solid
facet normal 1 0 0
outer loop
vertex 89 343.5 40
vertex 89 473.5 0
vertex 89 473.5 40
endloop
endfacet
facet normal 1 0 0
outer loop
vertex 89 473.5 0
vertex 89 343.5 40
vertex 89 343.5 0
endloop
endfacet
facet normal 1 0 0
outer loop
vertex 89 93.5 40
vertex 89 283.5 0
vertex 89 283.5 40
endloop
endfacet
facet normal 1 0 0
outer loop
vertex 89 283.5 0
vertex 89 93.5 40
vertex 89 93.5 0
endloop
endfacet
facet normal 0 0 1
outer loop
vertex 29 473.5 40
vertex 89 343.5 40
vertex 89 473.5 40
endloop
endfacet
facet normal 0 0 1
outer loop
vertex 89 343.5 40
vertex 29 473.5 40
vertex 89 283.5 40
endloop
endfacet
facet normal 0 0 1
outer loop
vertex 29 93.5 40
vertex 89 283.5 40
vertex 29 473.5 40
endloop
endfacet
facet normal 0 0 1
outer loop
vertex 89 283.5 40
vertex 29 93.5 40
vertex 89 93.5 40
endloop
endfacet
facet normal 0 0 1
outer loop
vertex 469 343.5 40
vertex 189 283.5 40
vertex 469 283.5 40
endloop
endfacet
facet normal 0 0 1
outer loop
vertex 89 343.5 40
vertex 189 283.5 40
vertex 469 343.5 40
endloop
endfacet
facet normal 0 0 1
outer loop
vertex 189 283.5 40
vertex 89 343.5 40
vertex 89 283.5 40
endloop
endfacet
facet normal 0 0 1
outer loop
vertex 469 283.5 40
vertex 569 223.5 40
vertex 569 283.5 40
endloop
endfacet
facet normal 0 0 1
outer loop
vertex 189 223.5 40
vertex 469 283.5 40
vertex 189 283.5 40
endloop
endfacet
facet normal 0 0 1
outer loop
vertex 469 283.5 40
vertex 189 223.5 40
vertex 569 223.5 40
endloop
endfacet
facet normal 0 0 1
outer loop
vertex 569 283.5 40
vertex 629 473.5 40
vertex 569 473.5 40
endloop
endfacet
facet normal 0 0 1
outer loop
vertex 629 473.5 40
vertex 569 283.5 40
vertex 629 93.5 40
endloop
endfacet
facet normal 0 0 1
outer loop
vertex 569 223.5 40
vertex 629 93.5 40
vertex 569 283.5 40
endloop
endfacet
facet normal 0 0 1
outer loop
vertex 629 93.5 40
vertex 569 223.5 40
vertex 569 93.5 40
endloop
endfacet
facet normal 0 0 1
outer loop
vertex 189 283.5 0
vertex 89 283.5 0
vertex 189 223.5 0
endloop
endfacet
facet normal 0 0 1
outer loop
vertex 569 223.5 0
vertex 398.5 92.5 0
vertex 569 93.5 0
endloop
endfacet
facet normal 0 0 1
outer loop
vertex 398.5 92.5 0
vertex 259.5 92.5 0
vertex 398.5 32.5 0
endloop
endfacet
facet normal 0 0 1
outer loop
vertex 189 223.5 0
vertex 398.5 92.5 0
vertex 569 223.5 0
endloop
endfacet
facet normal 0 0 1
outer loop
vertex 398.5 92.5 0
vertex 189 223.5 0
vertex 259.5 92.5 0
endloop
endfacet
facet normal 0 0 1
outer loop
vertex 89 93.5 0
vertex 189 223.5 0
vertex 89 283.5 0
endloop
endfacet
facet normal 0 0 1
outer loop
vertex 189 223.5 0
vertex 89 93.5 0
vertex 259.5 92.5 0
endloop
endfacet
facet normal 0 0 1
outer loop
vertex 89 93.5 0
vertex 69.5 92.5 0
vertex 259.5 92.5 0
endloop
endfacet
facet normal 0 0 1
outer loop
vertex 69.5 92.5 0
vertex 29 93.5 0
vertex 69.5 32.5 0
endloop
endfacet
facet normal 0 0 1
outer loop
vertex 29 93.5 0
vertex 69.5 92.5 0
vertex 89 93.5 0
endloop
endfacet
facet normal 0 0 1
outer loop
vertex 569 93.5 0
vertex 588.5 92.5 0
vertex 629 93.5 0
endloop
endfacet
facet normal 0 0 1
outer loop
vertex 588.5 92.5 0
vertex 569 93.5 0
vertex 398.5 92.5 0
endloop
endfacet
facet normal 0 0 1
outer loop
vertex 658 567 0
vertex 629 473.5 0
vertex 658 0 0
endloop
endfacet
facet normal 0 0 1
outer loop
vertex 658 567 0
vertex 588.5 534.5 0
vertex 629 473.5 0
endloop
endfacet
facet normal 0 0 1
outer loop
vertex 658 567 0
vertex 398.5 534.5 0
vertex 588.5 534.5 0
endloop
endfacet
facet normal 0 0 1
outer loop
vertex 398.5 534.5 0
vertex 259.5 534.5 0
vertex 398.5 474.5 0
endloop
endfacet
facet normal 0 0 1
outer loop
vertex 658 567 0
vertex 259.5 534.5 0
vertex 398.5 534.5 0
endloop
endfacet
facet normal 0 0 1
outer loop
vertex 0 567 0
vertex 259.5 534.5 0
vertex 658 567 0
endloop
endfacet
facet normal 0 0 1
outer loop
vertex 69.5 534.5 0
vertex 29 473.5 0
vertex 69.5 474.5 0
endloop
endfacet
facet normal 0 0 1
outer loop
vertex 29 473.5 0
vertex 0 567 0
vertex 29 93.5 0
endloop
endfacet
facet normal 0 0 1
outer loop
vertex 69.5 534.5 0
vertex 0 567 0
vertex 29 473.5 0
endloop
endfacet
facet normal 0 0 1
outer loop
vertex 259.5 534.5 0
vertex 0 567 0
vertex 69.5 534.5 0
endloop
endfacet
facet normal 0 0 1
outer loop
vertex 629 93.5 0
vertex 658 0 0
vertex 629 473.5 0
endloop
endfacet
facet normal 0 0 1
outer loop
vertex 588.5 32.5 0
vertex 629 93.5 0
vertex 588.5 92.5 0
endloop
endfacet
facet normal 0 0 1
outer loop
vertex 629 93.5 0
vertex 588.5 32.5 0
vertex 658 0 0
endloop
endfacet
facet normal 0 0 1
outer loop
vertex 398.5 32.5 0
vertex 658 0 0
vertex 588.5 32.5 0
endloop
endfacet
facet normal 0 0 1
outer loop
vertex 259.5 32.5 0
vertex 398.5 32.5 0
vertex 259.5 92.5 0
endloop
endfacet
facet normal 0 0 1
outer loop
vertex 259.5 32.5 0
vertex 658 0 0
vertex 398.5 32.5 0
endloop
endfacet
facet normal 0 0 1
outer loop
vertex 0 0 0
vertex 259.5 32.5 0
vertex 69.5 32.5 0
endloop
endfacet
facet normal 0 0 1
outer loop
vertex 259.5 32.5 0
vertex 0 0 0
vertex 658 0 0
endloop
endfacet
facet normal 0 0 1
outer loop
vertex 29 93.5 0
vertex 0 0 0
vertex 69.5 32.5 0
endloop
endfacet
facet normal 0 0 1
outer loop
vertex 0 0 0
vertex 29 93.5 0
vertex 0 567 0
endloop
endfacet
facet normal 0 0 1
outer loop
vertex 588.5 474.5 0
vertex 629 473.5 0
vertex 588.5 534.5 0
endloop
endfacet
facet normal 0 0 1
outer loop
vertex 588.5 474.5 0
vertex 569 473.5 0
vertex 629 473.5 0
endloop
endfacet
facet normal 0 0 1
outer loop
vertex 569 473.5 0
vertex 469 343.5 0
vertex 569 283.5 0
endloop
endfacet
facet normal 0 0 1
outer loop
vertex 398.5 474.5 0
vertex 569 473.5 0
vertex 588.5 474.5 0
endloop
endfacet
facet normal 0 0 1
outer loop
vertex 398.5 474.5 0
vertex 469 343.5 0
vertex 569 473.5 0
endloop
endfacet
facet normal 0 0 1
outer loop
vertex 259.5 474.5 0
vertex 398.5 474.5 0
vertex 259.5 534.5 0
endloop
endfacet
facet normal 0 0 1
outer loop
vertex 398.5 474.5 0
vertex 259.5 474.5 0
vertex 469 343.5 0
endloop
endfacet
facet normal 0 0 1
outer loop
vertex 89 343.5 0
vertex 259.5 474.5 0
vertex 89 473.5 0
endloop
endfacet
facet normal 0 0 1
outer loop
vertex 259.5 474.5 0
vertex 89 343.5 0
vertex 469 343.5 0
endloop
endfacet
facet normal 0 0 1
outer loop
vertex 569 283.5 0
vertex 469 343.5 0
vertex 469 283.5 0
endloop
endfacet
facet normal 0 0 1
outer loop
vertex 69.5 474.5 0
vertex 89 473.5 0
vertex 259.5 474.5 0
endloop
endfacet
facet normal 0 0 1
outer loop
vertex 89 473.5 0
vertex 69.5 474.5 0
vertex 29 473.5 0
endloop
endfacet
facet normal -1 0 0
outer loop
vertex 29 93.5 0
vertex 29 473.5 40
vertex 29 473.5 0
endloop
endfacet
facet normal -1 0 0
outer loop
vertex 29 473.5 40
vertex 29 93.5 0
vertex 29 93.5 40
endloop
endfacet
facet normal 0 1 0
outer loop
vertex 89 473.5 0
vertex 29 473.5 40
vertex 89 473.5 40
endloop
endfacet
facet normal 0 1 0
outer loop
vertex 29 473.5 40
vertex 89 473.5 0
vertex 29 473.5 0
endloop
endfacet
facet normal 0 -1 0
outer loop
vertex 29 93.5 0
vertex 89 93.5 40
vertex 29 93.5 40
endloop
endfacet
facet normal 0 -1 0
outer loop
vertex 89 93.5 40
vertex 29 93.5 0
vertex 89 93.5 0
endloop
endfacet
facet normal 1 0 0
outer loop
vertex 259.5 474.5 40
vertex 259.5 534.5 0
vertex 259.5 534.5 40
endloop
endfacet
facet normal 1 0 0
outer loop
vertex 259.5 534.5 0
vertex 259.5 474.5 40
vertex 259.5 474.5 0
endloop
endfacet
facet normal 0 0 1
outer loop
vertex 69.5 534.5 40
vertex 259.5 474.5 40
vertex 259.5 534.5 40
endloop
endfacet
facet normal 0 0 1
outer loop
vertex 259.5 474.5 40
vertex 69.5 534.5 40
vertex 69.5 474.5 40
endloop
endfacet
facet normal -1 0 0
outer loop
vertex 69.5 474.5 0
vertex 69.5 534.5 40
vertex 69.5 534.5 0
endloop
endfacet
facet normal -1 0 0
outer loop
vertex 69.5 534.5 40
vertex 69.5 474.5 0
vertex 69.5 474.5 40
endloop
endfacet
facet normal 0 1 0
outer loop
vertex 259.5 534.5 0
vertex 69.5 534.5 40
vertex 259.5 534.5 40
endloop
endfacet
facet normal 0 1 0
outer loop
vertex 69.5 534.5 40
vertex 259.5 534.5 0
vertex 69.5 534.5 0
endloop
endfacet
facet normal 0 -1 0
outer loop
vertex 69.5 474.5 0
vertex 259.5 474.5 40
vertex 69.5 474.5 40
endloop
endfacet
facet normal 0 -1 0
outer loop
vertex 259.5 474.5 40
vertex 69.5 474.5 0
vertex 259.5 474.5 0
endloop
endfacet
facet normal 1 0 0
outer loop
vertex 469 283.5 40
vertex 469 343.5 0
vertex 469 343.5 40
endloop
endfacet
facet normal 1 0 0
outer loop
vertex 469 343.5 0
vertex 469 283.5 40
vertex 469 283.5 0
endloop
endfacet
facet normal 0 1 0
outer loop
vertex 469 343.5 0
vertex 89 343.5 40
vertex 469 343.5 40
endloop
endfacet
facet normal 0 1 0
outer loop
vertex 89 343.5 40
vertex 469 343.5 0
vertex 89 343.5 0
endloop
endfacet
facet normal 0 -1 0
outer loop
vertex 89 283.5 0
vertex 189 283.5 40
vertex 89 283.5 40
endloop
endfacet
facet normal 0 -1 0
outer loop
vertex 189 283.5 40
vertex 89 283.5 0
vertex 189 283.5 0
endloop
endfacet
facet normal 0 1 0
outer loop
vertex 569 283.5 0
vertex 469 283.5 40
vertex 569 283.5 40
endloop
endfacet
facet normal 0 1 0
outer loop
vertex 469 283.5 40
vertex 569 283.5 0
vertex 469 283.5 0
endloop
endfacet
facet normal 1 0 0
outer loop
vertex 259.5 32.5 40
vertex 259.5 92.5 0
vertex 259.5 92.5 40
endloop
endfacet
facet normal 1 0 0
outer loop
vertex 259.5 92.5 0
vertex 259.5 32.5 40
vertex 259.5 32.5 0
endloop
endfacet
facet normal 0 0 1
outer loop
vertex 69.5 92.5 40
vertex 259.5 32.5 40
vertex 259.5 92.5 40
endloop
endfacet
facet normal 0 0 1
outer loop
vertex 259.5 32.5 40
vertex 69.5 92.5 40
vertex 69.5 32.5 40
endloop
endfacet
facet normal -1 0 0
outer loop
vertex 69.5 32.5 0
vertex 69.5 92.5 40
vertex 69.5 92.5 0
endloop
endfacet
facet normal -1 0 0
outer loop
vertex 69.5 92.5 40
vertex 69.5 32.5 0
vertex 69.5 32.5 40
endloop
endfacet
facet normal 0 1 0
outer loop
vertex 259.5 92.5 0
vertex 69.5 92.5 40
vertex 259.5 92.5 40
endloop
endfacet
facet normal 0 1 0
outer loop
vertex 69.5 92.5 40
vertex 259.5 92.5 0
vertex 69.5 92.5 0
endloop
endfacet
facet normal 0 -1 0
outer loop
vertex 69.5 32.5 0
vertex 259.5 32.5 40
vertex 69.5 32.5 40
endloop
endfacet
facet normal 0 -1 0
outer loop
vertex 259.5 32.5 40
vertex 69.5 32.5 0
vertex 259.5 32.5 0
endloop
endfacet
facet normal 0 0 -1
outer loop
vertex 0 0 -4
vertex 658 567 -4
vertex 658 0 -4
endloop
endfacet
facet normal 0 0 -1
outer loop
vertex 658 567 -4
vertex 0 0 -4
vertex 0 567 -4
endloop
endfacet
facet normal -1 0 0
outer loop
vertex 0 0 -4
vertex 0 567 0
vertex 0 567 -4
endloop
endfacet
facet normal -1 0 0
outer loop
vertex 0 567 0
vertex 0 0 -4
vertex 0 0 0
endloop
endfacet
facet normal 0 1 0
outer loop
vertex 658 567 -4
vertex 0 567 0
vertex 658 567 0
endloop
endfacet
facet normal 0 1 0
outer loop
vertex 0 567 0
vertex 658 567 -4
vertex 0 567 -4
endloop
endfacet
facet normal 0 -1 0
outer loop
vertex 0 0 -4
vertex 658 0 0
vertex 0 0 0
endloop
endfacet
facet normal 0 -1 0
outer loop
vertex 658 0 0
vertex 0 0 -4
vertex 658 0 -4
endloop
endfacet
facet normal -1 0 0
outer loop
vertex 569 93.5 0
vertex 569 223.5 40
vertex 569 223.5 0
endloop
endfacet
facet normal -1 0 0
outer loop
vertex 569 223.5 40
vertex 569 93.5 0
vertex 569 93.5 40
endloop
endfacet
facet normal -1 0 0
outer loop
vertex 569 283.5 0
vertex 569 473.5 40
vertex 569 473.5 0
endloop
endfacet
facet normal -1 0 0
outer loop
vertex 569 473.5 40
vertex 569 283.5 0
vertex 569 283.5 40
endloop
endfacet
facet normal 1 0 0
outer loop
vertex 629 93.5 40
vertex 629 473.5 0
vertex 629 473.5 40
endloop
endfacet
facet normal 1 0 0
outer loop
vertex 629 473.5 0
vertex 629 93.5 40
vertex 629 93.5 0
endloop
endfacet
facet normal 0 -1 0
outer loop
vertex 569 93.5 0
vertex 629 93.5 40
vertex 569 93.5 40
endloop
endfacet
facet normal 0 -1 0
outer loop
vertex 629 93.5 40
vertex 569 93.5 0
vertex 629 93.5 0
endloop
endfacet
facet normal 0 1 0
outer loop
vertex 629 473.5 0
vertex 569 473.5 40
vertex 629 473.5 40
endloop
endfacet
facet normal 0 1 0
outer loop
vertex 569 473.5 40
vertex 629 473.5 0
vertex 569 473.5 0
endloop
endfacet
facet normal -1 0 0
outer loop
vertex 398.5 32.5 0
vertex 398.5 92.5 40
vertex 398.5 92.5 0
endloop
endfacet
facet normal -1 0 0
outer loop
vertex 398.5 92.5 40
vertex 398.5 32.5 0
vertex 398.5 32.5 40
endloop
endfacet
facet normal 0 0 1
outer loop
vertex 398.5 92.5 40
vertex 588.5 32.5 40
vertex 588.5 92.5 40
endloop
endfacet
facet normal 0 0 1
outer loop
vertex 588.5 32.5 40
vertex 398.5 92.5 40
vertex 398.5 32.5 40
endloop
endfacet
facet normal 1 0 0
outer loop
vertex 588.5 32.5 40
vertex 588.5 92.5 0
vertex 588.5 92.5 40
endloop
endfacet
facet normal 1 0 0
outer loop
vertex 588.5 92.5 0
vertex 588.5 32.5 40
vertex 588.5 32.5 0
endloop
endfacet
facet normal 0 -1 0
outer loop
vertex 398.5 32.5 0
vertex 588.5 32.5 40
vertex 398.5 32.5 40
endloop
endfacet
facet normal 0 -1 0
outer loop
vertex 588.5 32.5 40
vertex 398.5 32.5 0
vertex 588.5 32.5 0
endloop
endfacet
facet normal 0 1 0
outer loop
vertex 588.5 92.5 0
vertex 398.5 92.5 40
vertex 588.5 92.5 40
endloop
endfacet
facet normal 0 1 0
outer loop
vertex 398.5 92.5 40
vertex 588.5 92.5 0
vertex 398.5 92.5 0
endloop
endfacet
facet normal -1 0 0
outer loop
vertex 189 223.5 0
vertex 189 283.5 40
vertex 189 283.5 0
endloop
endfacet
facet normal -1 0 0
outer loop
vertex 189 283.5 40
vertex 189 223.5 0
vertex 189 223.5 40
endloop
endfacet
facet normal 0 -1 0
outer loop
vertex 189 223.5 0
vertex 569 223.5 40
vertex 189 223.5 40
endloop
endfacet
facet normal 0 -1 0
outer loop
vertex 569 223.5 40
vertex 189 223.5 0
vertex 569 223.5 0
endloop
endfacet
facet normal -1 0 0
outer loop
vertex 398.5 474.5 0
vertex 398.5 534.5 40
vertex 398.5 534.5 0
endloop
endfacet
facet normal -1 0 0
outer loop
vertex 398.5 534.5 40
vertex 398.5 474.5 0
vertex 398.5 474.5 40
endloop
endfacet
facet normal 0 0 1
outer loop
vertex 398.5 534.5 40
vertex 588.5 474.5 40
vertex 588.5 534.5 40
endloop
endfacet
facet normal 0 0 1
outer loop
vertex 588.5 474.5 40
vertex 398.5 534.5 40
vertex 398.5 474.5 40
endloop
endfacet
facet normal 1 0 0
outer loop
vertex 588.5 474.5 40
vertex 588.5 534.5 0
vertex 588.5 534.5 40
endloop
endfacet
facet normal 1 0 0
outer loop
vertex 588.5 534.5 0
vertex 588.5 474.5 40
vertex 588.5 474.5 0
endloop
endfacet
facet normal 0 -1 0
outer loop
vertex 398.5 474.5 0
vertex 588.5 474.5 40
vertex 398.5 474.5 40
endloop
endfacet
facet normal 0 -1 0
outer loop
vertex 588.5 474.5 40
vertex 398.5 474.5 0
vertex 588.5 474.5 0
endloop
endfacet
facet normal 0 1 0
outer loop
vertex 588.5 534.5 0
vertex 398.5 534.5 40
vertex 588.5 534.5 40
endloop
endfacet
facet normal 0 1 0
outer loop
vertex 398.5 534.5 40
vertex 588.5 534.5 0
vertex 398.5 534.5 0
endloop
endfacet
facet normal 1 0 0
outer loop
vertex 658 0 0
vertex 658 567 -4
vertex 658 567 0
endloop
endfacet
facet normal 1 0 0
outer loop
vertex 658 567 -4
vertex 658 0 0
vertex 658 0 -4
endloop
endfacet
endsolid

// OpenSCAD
// Schweißtisch geschlossen

vkr_h=40;
vkr_l=380;
vkr_b=60;

p_h=4;
p_l=567;
p_b=329;

clear=1;
dist=0;

module mod() {
    // 1. bar
    color( "Olive", 1.0 ) {
        translate([0.5*vkr_b-clear,(p_l-vkr_l)/2]) {
            cube([vkr_b,vkr_l,vkr_h], 0);
        };
    };


/*
    // 2. bar
    translate([p_b-1.5*vkr_b-.5*clear,(p_l-vkr_l)/2-vkr_b-clear,0]) {
        color( "Lime", 1.0 ) {
            cube([vkr_b,vkr_l/2,vkr_h], 0);
        };
    };
    
    // 2. bar
    translate([p_b-1.5*vkr_b-.5*clear,(p_l/2)+vkr_b+clear,0]) {
        color( "Lime", 1.0 ) {
            cube([vkr_b,vkr_l/2,vkr_h], 0);
        };
    };
*/

    // 3. bar
    translate([((p_b-(vkr_l/2))/2),p_l/2+vkr_l/2+clear,0]) {
        color( "Red", 1.0 ) {
            cube([vkr_l/2,vkr_b,vkr_h], 0);
        };
    };
    
    // 4. bar
    translate([1.5*vkr_b-clear,p_l/2,0]) {
        color( "ForestGreen", 1.0 ) {
            cube([vkr_l,vkr_b,vkr_h], 0);
        };
    };
    
    // 5. bar
    translate([((p_b-(vkr_l/2))/2),(p_l-vkr_l)/2-vkr_b-clear,0]) {
        color( "Red", 1.0 ) {
            cube([vkr_l/2,vkr_b,vkr_h], 0);
        };
    };

    // Plate
    translate([0,0,-p_h]) {
        cube([p_b,p_l,p_h], 0);
    };
};


mod();

translate([p_b*2+dist,p_l,0]) {
    rotate(a=180, v=[0,0,1]){
        mod();
    };
};
